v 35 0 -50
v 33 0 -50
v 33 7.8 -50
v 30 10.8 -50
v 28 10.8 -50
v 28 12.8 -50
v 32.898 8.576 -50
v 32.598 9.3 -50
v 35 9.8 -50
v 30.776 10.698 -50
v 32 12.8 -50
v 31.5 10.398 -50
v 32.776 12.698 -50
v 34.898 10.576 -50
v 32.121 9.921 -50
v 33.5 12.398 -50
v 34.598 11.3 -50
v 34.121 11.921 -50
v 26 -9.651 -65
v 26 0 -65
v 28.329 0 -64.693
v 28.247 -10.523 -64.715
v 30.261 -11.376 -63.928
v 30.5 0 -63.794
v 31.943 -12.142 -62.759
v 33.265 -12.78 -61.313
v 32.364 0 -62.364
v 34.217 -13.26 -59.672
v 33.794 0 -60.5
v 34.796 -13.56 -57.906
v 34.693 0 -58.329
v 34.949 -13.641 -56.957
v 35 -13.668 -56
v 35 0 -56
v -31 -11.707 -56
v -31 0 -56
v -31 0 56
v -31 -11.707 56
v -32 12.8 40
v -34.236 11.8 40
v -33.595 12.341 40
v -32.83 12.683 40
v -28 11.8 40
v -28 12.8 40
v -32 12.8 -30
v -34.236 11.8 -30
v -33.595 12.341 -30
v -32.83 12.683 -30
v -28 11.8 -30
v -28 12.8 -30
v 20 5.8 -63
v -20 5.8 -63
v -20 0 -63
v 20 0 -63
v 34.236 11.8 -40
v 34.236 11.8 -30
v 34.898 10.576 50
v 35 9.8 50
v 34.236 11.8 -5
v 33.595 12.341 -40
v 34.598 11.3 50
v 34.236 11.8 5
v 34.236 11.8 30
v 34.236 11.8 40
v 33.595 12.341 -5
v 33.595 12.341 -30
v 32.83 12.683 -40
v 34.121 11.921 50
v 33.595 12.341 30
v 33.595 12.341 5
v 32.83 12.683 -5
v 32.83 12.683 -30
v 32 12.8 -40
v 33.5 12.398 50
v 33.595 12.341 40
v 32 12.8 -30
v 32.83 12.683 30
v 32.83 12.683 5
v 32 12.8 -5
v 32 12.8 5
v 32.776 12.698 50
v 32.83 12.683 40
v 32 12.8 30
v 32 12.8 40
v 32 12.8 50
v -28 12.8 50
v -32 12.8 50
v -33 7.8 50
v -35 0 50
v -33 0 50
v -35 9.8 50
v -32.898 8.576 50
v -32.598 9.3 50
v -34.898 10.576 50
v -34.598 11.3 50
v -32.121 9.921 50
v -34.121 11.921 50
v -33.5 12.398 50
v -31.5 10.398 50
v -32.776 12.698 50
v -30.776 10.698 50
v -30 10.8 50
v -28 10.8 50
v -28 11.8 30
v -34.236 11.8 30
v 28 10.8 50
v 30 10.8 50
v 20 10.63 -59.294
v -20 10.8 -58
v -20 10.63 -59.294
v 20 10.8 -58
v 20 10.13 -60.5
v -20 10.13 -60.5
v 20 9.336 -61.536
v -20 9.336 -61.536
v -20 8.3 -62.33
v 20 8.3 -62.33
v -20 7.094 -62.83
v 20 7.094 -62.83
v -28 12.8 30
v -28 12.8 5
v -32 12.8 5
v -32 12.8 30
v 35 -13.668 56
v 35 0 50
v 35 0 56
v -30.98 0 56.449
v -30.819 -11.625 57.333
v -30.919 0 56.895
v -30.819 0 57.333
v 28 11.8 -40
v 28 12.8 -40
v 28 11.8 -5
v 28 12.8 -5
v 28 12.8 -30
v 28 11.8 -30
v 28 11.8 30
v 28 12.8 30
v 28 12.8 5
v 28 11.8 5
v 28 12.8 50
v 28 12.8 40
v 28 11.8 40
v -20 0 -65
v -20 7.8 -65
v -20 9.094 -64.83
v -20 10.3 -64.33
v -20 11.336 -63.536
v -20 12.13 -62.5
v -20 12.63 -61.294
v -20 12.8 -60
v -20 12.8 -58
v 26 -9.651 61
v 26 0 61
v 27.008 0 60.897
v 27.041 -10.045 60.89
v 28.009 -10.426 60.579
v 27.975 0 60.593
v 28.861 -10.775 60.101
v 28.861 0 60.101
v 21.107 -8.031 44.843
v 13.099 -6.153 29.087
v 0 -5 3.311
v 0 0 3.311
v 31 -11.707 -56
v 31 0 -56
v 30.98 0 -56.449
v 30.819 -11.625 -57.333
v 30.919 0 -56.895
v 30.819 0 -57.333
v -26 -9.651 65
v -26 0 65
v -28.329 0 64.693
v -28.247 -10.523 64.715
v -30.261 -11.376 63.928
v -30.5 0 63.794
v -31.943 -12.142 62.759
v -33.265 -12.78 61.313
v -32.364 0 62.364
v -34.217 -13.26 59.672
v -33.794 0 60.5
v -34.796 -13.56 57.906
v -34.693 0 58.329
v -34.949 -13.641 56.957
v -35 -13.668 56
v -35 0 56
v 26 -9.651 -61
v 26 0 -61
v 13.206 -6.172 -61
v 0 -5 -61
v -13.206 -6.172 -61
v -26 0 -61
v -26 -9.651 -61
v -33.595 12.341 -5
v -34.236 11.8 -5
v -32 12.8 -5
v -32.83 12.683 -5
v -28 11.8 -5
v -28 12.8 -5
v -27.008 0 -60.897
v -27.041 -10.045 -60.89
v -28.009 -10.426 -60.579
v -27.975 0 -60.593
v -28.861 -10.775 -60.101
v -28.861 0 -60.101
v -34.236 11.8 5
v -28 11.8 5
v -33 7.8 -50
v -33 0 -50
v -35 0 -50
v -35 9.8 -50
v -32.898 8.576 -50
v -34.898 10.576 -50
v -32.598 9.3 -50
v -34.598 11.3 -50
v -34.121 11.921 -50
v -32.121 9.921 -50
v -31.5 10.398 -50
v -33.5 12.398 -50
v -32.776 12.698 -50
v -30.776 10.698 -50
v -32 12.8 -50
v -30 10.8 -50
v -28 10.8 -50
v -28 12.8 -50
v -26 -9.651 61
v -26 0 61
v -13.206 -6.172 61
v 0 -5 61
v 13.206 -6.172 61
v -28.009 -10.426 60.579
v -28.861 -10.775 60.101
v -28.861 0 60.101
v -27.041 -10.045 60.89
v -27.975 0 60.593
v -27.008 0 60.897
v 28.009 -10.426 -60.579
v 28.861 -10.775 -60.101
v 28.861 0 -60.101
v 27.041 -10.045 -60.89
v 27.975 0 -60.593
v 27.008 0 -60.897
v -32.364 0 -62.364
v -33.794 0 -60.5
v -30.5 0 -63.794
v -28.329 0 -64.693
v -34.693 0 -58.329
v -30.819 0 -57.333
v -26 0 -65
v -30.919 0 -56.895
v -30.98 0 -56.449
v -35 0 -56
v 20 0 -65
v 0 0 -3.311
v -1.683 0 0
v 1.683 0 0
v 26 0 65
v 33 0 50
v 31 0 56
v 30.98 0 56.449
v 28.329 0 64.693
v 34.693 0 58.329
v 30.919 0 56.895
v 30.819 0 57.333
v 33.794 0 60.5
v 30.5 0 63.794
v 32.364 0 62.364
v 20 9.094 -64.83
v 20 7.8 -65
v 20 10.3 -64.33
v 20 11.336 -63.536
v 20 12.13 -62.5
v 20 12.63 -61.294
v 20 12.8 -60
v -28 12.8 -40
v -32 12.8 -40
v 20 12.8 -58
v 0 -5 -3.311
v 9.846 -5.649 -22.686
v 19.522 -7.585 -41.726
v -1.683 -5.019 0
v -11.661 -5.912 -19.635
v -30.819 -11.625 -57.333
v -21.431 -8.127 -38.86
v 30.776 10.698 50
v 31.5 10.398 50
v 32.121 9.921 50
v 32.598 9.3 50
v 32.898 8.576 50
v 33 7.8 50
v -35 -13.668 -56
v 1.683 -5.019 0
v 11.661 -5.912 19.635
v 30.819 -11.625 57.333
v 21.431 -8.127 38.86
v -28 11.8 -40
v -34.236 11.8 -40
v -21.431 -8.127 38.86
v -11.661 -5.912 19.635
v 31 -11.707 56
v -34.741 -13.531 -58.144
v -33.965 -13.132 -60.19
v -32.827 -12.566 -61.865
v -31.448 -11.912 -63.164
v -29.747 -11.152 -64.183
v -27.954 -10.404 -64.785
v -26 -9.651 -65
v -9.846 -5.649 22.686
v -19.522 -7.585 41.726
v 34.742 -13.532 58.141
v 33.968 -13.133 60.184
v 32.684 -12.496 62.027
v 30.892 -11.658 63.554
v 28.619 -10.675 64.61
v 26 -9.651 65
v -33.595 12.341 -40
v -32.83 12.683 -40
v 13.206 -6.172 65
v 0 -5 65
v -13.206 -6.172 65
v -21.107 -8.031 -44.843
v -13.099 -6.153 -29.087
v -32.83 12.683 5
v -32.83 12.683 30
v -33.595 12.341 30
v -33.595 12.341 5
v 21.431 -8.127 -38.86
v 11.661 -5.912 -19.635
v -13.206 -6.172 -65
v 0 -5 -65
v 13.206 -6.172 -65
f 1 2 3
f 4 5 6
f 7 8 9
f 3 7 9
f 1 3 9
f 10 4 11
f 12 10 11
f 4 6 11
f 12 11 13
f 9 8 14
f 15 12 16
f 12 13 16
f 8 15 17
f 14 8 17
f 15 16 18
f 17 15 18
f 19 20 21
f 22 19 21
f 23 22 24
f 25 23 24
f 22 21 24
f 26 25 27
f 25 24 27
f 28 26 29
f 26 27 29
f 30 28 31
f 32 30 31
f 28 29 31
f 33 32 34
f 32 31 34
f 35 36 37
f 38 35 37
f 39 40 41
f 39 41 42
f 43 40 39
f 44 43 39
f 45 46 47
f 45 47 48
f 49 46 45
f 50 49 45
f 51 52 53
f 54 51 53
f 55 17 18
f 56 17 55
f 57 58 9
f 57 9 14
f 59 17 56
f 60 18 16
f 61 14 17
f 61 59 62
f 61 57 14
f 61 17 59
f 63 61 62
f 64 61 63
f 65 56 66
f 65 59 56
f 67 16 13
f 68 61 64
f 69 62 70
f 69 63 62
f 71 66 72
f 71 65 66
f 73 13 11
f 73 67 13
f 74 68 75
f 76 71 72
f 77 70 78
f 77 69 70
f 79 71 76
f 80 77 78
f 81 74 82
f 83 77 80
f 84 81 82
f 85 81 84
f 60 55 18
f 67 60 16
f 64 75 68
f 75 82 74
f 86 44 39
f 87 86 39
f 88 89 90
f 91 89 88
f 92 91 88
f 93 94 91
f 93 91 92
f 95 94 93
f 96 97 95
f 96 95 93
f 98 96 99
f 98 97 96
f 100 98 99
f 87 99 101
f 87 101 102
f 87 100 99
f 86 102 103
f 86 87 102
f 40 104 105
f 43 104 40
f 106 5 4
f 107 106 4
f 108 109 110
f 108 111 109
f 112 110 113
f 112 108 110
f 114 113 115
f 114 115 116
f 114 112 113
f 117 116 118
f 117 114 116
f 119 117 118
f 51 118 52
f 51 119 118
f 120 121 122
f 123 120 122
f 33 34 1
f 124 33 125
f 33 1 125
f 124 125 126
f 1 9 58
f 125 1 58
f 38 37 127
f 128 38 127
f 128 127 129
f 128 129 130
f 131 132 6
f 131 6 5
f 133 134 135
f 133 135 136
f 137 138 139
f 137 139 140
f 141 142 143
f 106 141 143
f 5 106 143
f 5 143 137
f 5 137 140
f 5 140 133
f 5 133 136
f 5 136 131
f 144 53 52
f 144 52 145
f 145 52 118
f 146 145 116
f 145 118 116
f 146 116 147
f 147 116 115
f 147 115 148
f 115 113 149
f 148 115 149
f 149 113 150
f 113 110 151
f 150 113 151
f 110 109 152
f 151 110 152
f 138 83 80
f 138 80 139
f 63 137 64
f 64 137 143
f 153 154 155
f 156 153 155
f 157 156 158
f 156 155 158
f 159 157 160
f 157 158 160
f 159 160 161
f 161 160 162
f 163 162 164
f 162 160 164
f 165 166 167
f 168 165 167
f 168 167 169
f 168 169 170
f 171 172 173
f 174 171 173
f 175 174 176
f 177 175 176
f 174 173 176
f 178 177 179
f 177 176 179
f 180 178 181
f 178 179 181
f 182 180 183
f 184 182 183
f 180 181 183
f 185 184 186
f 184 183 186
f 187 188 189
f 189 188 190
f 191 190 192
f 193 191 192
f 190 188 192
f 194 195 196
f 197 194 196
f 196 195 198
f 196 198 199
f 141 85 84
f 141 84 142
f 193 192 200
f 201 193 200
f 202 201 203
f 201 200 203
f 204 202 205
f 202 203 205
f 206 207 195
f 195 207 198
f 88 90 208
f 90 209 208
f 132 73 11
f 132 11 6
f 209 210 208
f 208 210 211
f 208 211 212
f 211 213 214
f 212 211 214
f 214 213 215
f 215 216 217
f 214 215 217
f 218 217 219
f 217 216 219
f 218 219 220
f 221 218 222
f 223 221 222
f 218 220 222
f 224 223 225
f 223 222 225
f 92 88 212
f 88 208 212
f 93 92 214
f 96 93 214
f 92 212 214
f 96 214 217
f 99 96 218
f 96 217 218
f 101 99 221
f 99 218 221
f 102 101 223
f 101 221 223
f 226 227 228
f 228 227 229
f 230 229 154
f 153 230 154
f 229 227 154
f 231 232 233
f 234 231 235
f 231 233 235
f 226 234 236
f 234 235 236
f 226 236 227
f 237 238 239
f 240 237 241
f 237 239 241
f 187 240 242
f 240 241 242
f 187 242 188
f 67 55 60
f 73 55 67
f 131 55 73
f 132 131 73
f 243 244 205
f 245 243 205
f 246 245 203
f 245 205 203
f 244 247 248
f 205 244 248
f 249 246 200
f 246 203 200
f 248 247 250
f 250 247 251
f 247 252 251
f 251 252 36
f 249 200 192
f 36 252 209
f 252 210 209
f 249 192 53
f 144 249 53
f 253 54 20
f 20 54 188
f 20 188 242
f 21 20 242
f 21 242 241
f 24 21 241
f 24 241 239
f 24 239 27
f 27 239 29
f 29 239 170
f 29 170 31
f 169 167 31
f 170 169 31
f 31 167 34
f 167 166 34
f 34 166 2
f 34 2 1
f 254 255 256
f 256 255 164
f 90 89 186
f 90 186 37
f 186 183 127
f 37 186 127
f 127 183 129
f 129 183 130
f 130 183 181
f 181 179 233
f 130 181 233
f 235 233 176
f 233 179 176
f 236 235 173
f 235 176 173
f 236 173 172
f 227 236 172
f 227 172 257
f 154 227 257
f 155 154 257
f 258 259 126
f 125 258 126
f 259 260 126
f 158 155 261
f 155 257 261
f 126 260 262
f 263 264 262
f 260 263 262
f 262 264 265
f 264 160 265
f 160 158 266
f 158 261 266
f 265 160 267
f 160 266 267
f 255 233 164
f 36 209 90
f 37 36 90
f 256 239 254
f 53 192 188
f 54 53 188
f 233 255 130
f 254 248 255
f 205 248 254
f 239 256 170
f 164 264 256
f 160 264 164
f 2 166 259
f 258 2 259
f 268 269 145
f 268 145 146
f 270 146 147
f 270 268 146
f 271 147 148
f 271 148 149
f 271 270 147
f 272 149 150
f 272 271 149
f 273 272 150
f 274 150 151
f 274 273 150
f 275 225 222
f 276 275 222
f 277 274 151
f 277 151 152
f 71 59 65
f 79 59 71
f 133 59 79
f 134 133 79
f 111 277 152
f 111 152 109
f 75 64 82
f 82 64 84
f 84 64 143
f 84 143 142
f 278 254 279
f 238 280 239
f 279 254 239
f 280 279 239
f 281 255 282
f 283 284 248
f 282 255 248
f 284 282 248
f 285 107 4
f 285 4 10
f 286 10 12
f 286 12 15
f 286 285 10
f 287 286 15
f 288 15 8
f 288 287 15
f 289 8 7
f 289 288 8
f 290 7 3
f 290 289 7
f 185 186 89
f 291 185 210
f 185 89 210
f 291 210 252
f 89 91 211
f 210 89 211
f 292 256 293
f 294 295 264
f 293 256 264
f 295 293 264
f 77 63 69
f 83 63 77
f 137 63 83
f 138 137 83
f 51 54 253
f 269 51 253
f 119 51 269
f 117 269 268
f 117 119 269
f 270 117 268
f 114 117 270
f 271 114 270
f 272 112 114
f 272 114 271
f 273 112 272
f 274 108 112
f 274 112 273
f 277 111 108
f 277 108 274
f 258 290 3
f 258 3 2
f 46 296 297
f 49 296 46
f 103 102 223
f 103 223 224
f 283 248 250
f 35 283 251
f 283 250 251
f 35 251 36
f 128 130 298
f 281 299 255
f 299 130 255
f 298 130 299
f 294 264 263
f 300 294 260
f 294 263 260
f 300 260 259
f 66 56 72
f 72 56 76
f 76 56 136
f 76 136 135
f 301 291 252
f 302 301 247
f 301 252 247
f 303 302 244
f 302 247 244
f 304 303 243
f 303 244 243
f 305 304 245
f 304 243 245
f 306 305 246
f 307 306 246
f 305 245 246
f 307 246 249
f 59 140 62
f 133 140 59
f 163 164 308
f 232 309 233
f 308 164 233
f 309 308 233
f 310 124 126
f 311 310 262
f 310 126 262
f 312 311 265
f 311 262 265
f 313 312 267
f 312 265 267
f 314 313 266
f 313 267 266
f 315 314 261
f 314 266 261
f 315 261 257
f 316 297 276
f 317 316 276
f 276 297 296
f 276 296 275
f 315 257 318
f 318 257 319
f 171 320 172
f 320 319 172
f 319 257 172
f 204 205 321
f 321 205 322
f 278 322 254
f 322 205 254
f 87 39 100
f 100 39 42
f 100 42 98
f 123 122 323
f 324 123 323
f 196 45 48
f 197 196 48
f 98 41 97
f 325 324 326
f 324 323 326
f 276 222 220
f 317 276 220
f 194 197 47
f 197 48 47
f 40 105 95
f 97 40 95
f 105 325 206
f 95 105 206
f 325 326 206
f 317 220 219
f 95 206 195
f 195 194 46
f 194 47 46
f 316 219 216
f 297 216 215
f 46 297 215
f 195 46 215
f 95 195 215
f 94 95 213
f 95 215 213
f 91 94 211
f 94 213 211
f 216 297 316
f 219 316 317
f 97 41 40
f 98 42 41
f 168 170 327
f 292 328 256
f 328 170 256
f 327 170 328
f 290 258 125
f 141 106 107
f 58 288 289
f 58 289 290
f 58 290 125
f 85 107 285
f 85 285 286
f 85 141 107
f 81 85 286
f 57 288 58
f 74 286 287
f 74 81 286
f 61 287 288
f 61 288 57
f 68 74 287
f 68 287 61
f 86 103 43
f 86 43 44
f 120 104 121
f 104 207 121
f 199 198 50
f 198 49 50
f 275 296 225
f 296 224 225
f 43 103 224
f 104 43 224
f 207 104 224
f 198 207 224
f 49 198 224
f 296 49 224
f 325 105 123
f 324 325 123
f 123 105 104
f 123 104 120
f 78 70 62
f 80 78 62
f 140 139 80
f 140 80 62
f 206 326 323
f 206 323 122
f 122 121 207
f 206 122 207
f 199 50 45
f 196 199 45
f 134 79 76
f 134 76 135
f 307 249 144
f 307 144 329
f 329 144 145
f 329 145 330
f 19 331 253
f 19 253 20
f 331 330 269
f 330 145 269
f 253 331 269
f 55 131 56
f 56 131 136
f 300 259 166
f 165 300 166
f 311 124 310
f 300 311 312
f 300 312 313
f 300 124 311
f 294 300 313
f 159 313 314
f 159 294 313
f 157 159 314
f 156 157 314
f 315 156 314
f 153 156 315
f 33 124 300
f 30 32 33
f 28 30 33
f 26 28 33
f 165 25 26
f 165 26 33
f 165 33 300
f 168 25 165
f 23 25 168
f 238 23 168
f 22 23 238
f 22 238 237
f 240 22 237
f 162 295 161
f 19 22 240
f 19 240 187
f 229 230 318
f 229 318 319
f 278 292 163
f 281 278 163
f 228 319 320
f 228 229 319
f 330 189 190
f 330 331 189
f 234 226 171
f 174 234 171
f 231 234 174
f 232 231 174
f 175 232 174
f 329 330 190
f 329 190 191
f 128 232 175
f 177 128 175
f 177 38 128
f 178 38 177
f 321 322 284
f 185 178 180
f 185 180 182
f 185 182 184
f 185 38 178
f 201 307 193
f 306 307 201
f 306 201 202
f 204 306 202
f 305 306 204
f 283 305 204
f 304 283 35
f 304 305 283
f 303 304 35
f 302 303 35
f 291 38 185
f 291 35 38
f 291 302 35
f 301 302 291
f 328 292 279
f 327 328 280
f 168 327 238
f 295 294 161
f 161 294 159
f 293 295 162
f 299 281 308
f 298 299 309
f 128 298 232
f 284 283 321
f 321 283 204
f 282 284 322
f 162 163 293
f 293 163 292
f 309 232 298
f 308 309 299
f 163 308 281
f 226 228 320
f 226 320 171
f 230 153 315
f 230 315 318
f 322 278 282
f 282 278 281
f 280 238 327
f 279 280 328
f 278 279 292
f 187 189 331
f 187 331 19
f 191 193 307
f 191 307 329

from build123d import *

# Parameters (mm, degrees)
F1_DEPTH      = 25
F2_R          = 75
F3_DEPTH      = 65.001
F3_DEPTH_BACK = 65.001
F5_DEPTH      = 50
F7_DEPTH      = 20
F8_W          = 1
F8_H          = 10
F9_DEPTH      = 35.0010001
F9_DEPTH_BACK = 35.0010001


with BuildPart() as f1:
    # F0 (on Front) → F1 (new body)
    with BuildSketch(Plane.XZ):
        with BuildLine():
            Line((26, 65), (-26, 65))
            ThreePointArc((-26, 65), (-32.3639610307, 62.3639610307), (-35, 56))
            Line((-35, 56), (-35, -56))
            ThreePointArc((-35, -56), (-32.3639610307, -62.3639610307), (-26, -65))
            Line((-26, -65), (26, -65))
            ThreePointArc((26, -65), (32.3639610307, -62.3639610307), (35, -56))
            Line((35, -56), (35, 56))
            ThreePointArc((35, 56), (32.3639610307, 62.3639610307), (26, 65))
        make_face()
        with BuildLine():
            ThreePointArc((-28.8605034902, 60.1009169441), (-27.4992356852, 60.7699363057), (-26, 61))
            Line((-26, 61), (26, 61))
            ThreePointArc((26, 61), (27.4992356852, 60.7699363057), (28.8605034902, 60.1009169441))
            Line((28.8605034902, 60.1009169441), (29.6627722225, 61.6795747722))
            ThreePointArc((29.6627722225, 61.6795747722), (31.6795747722, 62.3372277775), (32.3372277775, 60.3204252278))
            Line((32.3372277775, 60.3204252278), (30.8190334092, 57.333010503))
            ThreePointArc((30.8190334092, 57.333010503), (30.9545517984, 56.6726191174), (31, 56))
            Line((31, 56), (31, -56))
            ThreePointArc((31, -56), (30.9545517984, -56.6726191174), (30.8190334092, -57.333010503))
            Line((30.8190334092, -57.333010503), (32.3372277775, -60.3204252278))
            ThreePointArc((32.3372277775, -60.3204252278), (31.6795747722, -62.3372277775), (29.6627722225, -61.6795747722))
            Line((29.6627722225, -61.6795747722), (28.8605034902, -60.1009169441))
            ThreePointArc((28.8605034902, -60.1009169441), (27.4992356852, -60.7699363057), (26, -61))
            Line((26, -61), (-26, -61))
            ThreePointArc((-26, -61), (-27.4992356852, -60.7699363057), (-28.8605034902, -60.1009169441))
            Line((-28.8605034902, -60.1009169441), (-29.6627722225, -61.6795747722))
            ThreePointArc((-29.6627722225, -61.6795747722), (-31.6795747722, -62.3372277775), (-32.3372277775, -60.3204252278))
            Line((-32.3372277775, -60.3204252278), (-30.8190334092, -57.333010503))
            ThreePointArc((-30.8190334092, -57.333010503), (-30.9545517984, -56.6726191174), (-31, -56))
            Line((-31, -56), (-31, 56))
            ThreePointArc((-31, 56), (-30.9545517984, 56.6726191174), (-30.8190334092, 57.333010503))
            Line((-30.8190334092, 57.333010503), (-32.3372277775, 60.3204252278))
            ThreePointArc((-32.3372277775, 60.3204252278), (-31.6795747722, 62.3372277775), (-29.6627722225, 61.6795747722))
            Line((-29.6627722225, 61.6795747722), (-28.8605034902, 60.1009169441))
        make_face(mode=Mode.SUBTRACT)
        with BuildLine():
            Line((-0.8412927243, -1.6554469737), (-1.6825854486, 0))
            Line((-1.6825854486, 0), (-30.8190334092, -57.333010503))
            ThreePointArc((-30.8190334092, -57.333010503), (-30.4840056321, -58.2121694083), (-29.9902146421, -59.0130030054))
            Line((-29.9902146421, -59.0130030054), (-0.8412927243, -1.6554469737))
        make_face()
        with BuildLine():
            Line((-0.8412927243, 1.6554469737), (-29.9902146421, 59.0130030054))
            ThreePointArc((-29.9902146421, 59.0130030054), (-30.4840056321, 58.2121694083), (-30.8190334092, 57.333010503))
            Line((-30.8190334092, 57.333010503), (-1.6825854486, 0))
            Line((-1.6825854486, 0), (-0.8412927243, 1.6554469737))
        make_face()
        with BuildLine():
            ThreePointArc((30.8190334092, 57.333010503), (30.4840056321, 58.2121694083), (29.9902146421, 59.0130030054))
            Line((29.9902146421, 59.0130030054), (0.8412927243, 1.6554469737))
            Line((0.8412927243, 1.6554469737), (1.6825854486, 0))
            Line((1.6825854486, 0), (30.8190334092, 57.333010503))
        make_face()
        with BuildLine():
            Line((30.8190334092, -57.333010503), (1.6825854486, 0))
            Line((1.6825854486, 0), (0.8412927243, -1.6554469737))
            Line((0.8412927243, -1.6554469737), (29.9902146421, -59.0130030054))
            ThreePointArc((29.9902146421, -59.0130030054), (30.4840056321, -58.2121694083), (30.8190334092, -57.333010503))
        make_face()
        with BuildLine():
            Line((0, -3.3108939473), (-0.8412927243, -1.6554469737))
            Line((-0.8412927243, -1.6554469737), (-29.9902146421, -59.0130030054))
            ThreePointArc((-29.9902146421, -59.0130030054), (-29.4682811184, -59.6015310749), (-28.8605034902, -60.1009169441))
            Line((-28.8605034902, -60.1009169441), (0, -3.3108939473))
        make_face()
        with BuildLine():
            Line((0, 3.3108939473), (-28.8605034902, 60.1009169441))
            ThreePointArc((-28.8605034902, 60.1009169441), (-29.4682811184, 59.6015310749), (-29.9902146421, 59.0130030054))
            Line((-29.9902146421, 59.0130030054), (-0.8412927243, 1.6554469737))
            Line((-0.8412927243, 1.6554469737), (0, 3.3108939473))
        make_face()
        with BuildLine():
            ThreePointArc((29.9902146421, 59.0130030054), (29.4682811184, 59.6015310749), (28.8605034902, 60.1009169441))
            Line((28.8605034902, 60.1009169441), (0, 3.3108939473))
            Line((0, 3.3108939473), (0.8412927243, 1.6554469737))
            Line((0.8412927243, 1.6554469737), (29.9902146421, 59.0130030054))
        make_face()
        with BuildLine():
            Line((29.9902146421, -59.0130030054), (0.8412927243, -1.6554469737))
            Line((0.8412927243, -1.6554469737), (0, -3.3108939473))
            Line((0, -3.3108939473), (28.8605034902, -60.1009169441))
            ThreePointArc((28.8605034902, -60.1009169441), (29.4682811184, -59.6015310749), (29.9902146421, -59.0130030054))
        make_face()
        with BuildLine():
            ThreePointArc((-29.9902146421, -59.0130030054), (-30.4840056321, -58.2121694083), (-30.8190334092, -57.333010503))
            Line((-30.8190334092, -57.333010503), (-32.3372277775, -60.3204252278))
            ThreePointArc((-32.3372277775, -60.3204252278), (-31.6795747722, -62.3372277775), (-29.6627722225, -61.6795747722))
            Line((-29.6627722225, -61.6795747722), (-28.8605034902, -60.1009169441))
            ThreePointArc((-28.8605034902, -60.1009169441), (-29.4682811184, -59.6015310749), (-29.9902146421, -59.0130030054))
        make_face()
        with BuildLine():
            ThreePointArc((-29.9902146421, 59.0130030054), (-29.4682811184, 59.6015310749), (-28.8605034902, 60.1009169441))
            Line((-28.8605034902, 60.1009169441), (-29.6627722225, 61.6795747722))
            ThreePointArc((-29.6627722225, 61.6795747722), (-31.6795747722, 62.3372277775), (-32.3372277775, 60.3204252278))
            Line((-32.3372277775, 60.3204252278), (-30.8190334092, 57.333010503))
            ThreePointArc((-30.8190334092, 57.333010503), (-30.4840056321, 58.2121694083), (-29.9902146421, 59.0130030054))
        make_face()
        with BuildLine():
            Line((29.6627722225, 61.6795747722), (28.8605034902, 60.1009169441))
            ThreePointArc((28.8605034902, 60.1009169441), (29.4682811184, 59.6015310749), (29.9902146421, 59.0130030054))
            ThreePointArc((29.9902146421, 59.0130030054), (30.4840056321, 58.2121694083), (30.8190334092, 57.333010503))
            Line((30.8190334092, 57.333010503), (32.3372277775, 60.3204252278))
            ThreePointArc((32.3372277775, 60.3204252278), (31.6795747722, 62.3372277775), (29.6627722225, 61.6795747722))
        make_face()
        with BuildLine():
            Line((32.3372277775, -60.3204252278), (30.8190334092, -57.333010503))
            ThreePointArc((30.8190334092, -57.333010503), (30.4840056321, -58.2121694083), (29.9902146421, -59.0130030054))
            ThreePointArc((29.9902146421, -59.0130030054), (29.4682811184, -59.6015310749), (28.8605034902, -60.1009169441))
            Line((28.8605034902, -60.1009169441), (29.6627722225, -61.6795747722))
            ThreePointArc((29.6627722225, -61.6795747722), (31.6795747722, -62.3372277775), (32.3372277775, -60.3204252278))
        make_face()
        Polygon((0.8412927243, 1.6554469737), (0, 3.3108939473), (-0.8412927243, 1.6554469737), (0, 0), align=None)
        Polygon((0, 0), (-0.8412927243, 1.6554469737), (-1.6825854486, 0), (-0.8412927243, -1.6554469737), align=None)
        Polygon((1.6825854486, 0), (0.8412927243, 1.6554469737), (0, 0), (0.8412927243, -1.6554469737), align=None)
        Polygon((0.8412927243, -1.6554469737), (0, 0), (-0.8412927243, -1.6554469737), (0, -3.3108939473), align=None)
    extrude(amount=F1_DEPTH)

    # F2 (on Top) → F3 (cut, two sides)
    with BuildSketch(Plane.XY) as f3_sk:
        with Locations((0, -80)):
            Circle(F2_R)
    extrude(amount=-F3_DEPTH, mode=Mode.SUBTRACT)
    extrude(f3_sk.sketch, amount=F3_DEPTH_BACK, mode=Mode.SUBTRACT)

    # F4 (on Top) → F5 (join, symmetric)
    with BuildSketch(Plane.XY):
        with BuildLine():
            Line((-35, 9.8), (-35, 0))
            Line((-35, 0), (-33, 0))
            Line((-33, 0), (-33, 7.8))
            ThreePointArc((-33, 7.8), (-32.1213203436, 9.9213203436), (-30, 10.8))
            Line((-30, 10.8), (-28, 10.8))
            Line((-28, 10.8), (-28, 12.8))
            Line((-28, 12.8), (-32, 12.8))
            ThreePointArc((-32, 12.8), (-34.1213203436, 11.9213203436), (-35, 9.8))
        make_face()
        with BuildLine():
            Line((32, 12.8), (28, 12.8))
            Line((28, 12.8), (28, 10.8))
            Line((28, 10.8), (30, 10.8))
            ThreePointArc((30, 10.8), (32.1213203436, 9.9213203436), (33, 7.8))
            Line((33, 7.8), (33, 0))
            Line((33, 0), (35, 0))
            Line((35, 0), (35, 9.8))
            ThreePointArc((35, 9.8), (34.1213203436, 11.9213203436), (32, 12.8))
        make_face()
    extrude(amount=F5_DEPTH, both=True)

    # F6 (on Right) → F7 (join, symmetric)
    with BuildSketch(Plane.YZ):
        with BuildLine():
            Line((0, -63), (0, -65))
            Line((0, -65), (7.8, -65))
            ThreePointArc((7.8, -65), (11.3355339059, -63.5355339059), (12.8, -60))
            Line((12.8, -60), (12.8, -58))
            Line((12.8, -58), (10.8, -58))
            ThreePointArc((10.8, -58), (9.3355339059, -61.5355339059), (5.8, -63))
            Line((5.8, -63), (0, -63))
        make_face()
    extrude(amount=F7_DEPTH, both=True)

    # F8 (on Right) → F9 (cut, two sides)
    with BuildSketch(Plane.YZ) as f9_sk:
        with Locations((12.3, 35)):
            Rectangle(F8_W, F8_H)
        with Locations((12.3, -35)):
            Rectangle(F8_W, F8_H)
        Polygon((12.8, 5), (11.8, 5), (11.8, -5), (12.8, -5), (12.8, 0), align=None)
    extrude(amount=-F9_DEPTH, mode=Mode.SUBTRACT)
    extrude(f9_sk.sketch, amount=F9_DEPTH_BACK, mode=Mode.SUBTRACT)


solid = f1.part
